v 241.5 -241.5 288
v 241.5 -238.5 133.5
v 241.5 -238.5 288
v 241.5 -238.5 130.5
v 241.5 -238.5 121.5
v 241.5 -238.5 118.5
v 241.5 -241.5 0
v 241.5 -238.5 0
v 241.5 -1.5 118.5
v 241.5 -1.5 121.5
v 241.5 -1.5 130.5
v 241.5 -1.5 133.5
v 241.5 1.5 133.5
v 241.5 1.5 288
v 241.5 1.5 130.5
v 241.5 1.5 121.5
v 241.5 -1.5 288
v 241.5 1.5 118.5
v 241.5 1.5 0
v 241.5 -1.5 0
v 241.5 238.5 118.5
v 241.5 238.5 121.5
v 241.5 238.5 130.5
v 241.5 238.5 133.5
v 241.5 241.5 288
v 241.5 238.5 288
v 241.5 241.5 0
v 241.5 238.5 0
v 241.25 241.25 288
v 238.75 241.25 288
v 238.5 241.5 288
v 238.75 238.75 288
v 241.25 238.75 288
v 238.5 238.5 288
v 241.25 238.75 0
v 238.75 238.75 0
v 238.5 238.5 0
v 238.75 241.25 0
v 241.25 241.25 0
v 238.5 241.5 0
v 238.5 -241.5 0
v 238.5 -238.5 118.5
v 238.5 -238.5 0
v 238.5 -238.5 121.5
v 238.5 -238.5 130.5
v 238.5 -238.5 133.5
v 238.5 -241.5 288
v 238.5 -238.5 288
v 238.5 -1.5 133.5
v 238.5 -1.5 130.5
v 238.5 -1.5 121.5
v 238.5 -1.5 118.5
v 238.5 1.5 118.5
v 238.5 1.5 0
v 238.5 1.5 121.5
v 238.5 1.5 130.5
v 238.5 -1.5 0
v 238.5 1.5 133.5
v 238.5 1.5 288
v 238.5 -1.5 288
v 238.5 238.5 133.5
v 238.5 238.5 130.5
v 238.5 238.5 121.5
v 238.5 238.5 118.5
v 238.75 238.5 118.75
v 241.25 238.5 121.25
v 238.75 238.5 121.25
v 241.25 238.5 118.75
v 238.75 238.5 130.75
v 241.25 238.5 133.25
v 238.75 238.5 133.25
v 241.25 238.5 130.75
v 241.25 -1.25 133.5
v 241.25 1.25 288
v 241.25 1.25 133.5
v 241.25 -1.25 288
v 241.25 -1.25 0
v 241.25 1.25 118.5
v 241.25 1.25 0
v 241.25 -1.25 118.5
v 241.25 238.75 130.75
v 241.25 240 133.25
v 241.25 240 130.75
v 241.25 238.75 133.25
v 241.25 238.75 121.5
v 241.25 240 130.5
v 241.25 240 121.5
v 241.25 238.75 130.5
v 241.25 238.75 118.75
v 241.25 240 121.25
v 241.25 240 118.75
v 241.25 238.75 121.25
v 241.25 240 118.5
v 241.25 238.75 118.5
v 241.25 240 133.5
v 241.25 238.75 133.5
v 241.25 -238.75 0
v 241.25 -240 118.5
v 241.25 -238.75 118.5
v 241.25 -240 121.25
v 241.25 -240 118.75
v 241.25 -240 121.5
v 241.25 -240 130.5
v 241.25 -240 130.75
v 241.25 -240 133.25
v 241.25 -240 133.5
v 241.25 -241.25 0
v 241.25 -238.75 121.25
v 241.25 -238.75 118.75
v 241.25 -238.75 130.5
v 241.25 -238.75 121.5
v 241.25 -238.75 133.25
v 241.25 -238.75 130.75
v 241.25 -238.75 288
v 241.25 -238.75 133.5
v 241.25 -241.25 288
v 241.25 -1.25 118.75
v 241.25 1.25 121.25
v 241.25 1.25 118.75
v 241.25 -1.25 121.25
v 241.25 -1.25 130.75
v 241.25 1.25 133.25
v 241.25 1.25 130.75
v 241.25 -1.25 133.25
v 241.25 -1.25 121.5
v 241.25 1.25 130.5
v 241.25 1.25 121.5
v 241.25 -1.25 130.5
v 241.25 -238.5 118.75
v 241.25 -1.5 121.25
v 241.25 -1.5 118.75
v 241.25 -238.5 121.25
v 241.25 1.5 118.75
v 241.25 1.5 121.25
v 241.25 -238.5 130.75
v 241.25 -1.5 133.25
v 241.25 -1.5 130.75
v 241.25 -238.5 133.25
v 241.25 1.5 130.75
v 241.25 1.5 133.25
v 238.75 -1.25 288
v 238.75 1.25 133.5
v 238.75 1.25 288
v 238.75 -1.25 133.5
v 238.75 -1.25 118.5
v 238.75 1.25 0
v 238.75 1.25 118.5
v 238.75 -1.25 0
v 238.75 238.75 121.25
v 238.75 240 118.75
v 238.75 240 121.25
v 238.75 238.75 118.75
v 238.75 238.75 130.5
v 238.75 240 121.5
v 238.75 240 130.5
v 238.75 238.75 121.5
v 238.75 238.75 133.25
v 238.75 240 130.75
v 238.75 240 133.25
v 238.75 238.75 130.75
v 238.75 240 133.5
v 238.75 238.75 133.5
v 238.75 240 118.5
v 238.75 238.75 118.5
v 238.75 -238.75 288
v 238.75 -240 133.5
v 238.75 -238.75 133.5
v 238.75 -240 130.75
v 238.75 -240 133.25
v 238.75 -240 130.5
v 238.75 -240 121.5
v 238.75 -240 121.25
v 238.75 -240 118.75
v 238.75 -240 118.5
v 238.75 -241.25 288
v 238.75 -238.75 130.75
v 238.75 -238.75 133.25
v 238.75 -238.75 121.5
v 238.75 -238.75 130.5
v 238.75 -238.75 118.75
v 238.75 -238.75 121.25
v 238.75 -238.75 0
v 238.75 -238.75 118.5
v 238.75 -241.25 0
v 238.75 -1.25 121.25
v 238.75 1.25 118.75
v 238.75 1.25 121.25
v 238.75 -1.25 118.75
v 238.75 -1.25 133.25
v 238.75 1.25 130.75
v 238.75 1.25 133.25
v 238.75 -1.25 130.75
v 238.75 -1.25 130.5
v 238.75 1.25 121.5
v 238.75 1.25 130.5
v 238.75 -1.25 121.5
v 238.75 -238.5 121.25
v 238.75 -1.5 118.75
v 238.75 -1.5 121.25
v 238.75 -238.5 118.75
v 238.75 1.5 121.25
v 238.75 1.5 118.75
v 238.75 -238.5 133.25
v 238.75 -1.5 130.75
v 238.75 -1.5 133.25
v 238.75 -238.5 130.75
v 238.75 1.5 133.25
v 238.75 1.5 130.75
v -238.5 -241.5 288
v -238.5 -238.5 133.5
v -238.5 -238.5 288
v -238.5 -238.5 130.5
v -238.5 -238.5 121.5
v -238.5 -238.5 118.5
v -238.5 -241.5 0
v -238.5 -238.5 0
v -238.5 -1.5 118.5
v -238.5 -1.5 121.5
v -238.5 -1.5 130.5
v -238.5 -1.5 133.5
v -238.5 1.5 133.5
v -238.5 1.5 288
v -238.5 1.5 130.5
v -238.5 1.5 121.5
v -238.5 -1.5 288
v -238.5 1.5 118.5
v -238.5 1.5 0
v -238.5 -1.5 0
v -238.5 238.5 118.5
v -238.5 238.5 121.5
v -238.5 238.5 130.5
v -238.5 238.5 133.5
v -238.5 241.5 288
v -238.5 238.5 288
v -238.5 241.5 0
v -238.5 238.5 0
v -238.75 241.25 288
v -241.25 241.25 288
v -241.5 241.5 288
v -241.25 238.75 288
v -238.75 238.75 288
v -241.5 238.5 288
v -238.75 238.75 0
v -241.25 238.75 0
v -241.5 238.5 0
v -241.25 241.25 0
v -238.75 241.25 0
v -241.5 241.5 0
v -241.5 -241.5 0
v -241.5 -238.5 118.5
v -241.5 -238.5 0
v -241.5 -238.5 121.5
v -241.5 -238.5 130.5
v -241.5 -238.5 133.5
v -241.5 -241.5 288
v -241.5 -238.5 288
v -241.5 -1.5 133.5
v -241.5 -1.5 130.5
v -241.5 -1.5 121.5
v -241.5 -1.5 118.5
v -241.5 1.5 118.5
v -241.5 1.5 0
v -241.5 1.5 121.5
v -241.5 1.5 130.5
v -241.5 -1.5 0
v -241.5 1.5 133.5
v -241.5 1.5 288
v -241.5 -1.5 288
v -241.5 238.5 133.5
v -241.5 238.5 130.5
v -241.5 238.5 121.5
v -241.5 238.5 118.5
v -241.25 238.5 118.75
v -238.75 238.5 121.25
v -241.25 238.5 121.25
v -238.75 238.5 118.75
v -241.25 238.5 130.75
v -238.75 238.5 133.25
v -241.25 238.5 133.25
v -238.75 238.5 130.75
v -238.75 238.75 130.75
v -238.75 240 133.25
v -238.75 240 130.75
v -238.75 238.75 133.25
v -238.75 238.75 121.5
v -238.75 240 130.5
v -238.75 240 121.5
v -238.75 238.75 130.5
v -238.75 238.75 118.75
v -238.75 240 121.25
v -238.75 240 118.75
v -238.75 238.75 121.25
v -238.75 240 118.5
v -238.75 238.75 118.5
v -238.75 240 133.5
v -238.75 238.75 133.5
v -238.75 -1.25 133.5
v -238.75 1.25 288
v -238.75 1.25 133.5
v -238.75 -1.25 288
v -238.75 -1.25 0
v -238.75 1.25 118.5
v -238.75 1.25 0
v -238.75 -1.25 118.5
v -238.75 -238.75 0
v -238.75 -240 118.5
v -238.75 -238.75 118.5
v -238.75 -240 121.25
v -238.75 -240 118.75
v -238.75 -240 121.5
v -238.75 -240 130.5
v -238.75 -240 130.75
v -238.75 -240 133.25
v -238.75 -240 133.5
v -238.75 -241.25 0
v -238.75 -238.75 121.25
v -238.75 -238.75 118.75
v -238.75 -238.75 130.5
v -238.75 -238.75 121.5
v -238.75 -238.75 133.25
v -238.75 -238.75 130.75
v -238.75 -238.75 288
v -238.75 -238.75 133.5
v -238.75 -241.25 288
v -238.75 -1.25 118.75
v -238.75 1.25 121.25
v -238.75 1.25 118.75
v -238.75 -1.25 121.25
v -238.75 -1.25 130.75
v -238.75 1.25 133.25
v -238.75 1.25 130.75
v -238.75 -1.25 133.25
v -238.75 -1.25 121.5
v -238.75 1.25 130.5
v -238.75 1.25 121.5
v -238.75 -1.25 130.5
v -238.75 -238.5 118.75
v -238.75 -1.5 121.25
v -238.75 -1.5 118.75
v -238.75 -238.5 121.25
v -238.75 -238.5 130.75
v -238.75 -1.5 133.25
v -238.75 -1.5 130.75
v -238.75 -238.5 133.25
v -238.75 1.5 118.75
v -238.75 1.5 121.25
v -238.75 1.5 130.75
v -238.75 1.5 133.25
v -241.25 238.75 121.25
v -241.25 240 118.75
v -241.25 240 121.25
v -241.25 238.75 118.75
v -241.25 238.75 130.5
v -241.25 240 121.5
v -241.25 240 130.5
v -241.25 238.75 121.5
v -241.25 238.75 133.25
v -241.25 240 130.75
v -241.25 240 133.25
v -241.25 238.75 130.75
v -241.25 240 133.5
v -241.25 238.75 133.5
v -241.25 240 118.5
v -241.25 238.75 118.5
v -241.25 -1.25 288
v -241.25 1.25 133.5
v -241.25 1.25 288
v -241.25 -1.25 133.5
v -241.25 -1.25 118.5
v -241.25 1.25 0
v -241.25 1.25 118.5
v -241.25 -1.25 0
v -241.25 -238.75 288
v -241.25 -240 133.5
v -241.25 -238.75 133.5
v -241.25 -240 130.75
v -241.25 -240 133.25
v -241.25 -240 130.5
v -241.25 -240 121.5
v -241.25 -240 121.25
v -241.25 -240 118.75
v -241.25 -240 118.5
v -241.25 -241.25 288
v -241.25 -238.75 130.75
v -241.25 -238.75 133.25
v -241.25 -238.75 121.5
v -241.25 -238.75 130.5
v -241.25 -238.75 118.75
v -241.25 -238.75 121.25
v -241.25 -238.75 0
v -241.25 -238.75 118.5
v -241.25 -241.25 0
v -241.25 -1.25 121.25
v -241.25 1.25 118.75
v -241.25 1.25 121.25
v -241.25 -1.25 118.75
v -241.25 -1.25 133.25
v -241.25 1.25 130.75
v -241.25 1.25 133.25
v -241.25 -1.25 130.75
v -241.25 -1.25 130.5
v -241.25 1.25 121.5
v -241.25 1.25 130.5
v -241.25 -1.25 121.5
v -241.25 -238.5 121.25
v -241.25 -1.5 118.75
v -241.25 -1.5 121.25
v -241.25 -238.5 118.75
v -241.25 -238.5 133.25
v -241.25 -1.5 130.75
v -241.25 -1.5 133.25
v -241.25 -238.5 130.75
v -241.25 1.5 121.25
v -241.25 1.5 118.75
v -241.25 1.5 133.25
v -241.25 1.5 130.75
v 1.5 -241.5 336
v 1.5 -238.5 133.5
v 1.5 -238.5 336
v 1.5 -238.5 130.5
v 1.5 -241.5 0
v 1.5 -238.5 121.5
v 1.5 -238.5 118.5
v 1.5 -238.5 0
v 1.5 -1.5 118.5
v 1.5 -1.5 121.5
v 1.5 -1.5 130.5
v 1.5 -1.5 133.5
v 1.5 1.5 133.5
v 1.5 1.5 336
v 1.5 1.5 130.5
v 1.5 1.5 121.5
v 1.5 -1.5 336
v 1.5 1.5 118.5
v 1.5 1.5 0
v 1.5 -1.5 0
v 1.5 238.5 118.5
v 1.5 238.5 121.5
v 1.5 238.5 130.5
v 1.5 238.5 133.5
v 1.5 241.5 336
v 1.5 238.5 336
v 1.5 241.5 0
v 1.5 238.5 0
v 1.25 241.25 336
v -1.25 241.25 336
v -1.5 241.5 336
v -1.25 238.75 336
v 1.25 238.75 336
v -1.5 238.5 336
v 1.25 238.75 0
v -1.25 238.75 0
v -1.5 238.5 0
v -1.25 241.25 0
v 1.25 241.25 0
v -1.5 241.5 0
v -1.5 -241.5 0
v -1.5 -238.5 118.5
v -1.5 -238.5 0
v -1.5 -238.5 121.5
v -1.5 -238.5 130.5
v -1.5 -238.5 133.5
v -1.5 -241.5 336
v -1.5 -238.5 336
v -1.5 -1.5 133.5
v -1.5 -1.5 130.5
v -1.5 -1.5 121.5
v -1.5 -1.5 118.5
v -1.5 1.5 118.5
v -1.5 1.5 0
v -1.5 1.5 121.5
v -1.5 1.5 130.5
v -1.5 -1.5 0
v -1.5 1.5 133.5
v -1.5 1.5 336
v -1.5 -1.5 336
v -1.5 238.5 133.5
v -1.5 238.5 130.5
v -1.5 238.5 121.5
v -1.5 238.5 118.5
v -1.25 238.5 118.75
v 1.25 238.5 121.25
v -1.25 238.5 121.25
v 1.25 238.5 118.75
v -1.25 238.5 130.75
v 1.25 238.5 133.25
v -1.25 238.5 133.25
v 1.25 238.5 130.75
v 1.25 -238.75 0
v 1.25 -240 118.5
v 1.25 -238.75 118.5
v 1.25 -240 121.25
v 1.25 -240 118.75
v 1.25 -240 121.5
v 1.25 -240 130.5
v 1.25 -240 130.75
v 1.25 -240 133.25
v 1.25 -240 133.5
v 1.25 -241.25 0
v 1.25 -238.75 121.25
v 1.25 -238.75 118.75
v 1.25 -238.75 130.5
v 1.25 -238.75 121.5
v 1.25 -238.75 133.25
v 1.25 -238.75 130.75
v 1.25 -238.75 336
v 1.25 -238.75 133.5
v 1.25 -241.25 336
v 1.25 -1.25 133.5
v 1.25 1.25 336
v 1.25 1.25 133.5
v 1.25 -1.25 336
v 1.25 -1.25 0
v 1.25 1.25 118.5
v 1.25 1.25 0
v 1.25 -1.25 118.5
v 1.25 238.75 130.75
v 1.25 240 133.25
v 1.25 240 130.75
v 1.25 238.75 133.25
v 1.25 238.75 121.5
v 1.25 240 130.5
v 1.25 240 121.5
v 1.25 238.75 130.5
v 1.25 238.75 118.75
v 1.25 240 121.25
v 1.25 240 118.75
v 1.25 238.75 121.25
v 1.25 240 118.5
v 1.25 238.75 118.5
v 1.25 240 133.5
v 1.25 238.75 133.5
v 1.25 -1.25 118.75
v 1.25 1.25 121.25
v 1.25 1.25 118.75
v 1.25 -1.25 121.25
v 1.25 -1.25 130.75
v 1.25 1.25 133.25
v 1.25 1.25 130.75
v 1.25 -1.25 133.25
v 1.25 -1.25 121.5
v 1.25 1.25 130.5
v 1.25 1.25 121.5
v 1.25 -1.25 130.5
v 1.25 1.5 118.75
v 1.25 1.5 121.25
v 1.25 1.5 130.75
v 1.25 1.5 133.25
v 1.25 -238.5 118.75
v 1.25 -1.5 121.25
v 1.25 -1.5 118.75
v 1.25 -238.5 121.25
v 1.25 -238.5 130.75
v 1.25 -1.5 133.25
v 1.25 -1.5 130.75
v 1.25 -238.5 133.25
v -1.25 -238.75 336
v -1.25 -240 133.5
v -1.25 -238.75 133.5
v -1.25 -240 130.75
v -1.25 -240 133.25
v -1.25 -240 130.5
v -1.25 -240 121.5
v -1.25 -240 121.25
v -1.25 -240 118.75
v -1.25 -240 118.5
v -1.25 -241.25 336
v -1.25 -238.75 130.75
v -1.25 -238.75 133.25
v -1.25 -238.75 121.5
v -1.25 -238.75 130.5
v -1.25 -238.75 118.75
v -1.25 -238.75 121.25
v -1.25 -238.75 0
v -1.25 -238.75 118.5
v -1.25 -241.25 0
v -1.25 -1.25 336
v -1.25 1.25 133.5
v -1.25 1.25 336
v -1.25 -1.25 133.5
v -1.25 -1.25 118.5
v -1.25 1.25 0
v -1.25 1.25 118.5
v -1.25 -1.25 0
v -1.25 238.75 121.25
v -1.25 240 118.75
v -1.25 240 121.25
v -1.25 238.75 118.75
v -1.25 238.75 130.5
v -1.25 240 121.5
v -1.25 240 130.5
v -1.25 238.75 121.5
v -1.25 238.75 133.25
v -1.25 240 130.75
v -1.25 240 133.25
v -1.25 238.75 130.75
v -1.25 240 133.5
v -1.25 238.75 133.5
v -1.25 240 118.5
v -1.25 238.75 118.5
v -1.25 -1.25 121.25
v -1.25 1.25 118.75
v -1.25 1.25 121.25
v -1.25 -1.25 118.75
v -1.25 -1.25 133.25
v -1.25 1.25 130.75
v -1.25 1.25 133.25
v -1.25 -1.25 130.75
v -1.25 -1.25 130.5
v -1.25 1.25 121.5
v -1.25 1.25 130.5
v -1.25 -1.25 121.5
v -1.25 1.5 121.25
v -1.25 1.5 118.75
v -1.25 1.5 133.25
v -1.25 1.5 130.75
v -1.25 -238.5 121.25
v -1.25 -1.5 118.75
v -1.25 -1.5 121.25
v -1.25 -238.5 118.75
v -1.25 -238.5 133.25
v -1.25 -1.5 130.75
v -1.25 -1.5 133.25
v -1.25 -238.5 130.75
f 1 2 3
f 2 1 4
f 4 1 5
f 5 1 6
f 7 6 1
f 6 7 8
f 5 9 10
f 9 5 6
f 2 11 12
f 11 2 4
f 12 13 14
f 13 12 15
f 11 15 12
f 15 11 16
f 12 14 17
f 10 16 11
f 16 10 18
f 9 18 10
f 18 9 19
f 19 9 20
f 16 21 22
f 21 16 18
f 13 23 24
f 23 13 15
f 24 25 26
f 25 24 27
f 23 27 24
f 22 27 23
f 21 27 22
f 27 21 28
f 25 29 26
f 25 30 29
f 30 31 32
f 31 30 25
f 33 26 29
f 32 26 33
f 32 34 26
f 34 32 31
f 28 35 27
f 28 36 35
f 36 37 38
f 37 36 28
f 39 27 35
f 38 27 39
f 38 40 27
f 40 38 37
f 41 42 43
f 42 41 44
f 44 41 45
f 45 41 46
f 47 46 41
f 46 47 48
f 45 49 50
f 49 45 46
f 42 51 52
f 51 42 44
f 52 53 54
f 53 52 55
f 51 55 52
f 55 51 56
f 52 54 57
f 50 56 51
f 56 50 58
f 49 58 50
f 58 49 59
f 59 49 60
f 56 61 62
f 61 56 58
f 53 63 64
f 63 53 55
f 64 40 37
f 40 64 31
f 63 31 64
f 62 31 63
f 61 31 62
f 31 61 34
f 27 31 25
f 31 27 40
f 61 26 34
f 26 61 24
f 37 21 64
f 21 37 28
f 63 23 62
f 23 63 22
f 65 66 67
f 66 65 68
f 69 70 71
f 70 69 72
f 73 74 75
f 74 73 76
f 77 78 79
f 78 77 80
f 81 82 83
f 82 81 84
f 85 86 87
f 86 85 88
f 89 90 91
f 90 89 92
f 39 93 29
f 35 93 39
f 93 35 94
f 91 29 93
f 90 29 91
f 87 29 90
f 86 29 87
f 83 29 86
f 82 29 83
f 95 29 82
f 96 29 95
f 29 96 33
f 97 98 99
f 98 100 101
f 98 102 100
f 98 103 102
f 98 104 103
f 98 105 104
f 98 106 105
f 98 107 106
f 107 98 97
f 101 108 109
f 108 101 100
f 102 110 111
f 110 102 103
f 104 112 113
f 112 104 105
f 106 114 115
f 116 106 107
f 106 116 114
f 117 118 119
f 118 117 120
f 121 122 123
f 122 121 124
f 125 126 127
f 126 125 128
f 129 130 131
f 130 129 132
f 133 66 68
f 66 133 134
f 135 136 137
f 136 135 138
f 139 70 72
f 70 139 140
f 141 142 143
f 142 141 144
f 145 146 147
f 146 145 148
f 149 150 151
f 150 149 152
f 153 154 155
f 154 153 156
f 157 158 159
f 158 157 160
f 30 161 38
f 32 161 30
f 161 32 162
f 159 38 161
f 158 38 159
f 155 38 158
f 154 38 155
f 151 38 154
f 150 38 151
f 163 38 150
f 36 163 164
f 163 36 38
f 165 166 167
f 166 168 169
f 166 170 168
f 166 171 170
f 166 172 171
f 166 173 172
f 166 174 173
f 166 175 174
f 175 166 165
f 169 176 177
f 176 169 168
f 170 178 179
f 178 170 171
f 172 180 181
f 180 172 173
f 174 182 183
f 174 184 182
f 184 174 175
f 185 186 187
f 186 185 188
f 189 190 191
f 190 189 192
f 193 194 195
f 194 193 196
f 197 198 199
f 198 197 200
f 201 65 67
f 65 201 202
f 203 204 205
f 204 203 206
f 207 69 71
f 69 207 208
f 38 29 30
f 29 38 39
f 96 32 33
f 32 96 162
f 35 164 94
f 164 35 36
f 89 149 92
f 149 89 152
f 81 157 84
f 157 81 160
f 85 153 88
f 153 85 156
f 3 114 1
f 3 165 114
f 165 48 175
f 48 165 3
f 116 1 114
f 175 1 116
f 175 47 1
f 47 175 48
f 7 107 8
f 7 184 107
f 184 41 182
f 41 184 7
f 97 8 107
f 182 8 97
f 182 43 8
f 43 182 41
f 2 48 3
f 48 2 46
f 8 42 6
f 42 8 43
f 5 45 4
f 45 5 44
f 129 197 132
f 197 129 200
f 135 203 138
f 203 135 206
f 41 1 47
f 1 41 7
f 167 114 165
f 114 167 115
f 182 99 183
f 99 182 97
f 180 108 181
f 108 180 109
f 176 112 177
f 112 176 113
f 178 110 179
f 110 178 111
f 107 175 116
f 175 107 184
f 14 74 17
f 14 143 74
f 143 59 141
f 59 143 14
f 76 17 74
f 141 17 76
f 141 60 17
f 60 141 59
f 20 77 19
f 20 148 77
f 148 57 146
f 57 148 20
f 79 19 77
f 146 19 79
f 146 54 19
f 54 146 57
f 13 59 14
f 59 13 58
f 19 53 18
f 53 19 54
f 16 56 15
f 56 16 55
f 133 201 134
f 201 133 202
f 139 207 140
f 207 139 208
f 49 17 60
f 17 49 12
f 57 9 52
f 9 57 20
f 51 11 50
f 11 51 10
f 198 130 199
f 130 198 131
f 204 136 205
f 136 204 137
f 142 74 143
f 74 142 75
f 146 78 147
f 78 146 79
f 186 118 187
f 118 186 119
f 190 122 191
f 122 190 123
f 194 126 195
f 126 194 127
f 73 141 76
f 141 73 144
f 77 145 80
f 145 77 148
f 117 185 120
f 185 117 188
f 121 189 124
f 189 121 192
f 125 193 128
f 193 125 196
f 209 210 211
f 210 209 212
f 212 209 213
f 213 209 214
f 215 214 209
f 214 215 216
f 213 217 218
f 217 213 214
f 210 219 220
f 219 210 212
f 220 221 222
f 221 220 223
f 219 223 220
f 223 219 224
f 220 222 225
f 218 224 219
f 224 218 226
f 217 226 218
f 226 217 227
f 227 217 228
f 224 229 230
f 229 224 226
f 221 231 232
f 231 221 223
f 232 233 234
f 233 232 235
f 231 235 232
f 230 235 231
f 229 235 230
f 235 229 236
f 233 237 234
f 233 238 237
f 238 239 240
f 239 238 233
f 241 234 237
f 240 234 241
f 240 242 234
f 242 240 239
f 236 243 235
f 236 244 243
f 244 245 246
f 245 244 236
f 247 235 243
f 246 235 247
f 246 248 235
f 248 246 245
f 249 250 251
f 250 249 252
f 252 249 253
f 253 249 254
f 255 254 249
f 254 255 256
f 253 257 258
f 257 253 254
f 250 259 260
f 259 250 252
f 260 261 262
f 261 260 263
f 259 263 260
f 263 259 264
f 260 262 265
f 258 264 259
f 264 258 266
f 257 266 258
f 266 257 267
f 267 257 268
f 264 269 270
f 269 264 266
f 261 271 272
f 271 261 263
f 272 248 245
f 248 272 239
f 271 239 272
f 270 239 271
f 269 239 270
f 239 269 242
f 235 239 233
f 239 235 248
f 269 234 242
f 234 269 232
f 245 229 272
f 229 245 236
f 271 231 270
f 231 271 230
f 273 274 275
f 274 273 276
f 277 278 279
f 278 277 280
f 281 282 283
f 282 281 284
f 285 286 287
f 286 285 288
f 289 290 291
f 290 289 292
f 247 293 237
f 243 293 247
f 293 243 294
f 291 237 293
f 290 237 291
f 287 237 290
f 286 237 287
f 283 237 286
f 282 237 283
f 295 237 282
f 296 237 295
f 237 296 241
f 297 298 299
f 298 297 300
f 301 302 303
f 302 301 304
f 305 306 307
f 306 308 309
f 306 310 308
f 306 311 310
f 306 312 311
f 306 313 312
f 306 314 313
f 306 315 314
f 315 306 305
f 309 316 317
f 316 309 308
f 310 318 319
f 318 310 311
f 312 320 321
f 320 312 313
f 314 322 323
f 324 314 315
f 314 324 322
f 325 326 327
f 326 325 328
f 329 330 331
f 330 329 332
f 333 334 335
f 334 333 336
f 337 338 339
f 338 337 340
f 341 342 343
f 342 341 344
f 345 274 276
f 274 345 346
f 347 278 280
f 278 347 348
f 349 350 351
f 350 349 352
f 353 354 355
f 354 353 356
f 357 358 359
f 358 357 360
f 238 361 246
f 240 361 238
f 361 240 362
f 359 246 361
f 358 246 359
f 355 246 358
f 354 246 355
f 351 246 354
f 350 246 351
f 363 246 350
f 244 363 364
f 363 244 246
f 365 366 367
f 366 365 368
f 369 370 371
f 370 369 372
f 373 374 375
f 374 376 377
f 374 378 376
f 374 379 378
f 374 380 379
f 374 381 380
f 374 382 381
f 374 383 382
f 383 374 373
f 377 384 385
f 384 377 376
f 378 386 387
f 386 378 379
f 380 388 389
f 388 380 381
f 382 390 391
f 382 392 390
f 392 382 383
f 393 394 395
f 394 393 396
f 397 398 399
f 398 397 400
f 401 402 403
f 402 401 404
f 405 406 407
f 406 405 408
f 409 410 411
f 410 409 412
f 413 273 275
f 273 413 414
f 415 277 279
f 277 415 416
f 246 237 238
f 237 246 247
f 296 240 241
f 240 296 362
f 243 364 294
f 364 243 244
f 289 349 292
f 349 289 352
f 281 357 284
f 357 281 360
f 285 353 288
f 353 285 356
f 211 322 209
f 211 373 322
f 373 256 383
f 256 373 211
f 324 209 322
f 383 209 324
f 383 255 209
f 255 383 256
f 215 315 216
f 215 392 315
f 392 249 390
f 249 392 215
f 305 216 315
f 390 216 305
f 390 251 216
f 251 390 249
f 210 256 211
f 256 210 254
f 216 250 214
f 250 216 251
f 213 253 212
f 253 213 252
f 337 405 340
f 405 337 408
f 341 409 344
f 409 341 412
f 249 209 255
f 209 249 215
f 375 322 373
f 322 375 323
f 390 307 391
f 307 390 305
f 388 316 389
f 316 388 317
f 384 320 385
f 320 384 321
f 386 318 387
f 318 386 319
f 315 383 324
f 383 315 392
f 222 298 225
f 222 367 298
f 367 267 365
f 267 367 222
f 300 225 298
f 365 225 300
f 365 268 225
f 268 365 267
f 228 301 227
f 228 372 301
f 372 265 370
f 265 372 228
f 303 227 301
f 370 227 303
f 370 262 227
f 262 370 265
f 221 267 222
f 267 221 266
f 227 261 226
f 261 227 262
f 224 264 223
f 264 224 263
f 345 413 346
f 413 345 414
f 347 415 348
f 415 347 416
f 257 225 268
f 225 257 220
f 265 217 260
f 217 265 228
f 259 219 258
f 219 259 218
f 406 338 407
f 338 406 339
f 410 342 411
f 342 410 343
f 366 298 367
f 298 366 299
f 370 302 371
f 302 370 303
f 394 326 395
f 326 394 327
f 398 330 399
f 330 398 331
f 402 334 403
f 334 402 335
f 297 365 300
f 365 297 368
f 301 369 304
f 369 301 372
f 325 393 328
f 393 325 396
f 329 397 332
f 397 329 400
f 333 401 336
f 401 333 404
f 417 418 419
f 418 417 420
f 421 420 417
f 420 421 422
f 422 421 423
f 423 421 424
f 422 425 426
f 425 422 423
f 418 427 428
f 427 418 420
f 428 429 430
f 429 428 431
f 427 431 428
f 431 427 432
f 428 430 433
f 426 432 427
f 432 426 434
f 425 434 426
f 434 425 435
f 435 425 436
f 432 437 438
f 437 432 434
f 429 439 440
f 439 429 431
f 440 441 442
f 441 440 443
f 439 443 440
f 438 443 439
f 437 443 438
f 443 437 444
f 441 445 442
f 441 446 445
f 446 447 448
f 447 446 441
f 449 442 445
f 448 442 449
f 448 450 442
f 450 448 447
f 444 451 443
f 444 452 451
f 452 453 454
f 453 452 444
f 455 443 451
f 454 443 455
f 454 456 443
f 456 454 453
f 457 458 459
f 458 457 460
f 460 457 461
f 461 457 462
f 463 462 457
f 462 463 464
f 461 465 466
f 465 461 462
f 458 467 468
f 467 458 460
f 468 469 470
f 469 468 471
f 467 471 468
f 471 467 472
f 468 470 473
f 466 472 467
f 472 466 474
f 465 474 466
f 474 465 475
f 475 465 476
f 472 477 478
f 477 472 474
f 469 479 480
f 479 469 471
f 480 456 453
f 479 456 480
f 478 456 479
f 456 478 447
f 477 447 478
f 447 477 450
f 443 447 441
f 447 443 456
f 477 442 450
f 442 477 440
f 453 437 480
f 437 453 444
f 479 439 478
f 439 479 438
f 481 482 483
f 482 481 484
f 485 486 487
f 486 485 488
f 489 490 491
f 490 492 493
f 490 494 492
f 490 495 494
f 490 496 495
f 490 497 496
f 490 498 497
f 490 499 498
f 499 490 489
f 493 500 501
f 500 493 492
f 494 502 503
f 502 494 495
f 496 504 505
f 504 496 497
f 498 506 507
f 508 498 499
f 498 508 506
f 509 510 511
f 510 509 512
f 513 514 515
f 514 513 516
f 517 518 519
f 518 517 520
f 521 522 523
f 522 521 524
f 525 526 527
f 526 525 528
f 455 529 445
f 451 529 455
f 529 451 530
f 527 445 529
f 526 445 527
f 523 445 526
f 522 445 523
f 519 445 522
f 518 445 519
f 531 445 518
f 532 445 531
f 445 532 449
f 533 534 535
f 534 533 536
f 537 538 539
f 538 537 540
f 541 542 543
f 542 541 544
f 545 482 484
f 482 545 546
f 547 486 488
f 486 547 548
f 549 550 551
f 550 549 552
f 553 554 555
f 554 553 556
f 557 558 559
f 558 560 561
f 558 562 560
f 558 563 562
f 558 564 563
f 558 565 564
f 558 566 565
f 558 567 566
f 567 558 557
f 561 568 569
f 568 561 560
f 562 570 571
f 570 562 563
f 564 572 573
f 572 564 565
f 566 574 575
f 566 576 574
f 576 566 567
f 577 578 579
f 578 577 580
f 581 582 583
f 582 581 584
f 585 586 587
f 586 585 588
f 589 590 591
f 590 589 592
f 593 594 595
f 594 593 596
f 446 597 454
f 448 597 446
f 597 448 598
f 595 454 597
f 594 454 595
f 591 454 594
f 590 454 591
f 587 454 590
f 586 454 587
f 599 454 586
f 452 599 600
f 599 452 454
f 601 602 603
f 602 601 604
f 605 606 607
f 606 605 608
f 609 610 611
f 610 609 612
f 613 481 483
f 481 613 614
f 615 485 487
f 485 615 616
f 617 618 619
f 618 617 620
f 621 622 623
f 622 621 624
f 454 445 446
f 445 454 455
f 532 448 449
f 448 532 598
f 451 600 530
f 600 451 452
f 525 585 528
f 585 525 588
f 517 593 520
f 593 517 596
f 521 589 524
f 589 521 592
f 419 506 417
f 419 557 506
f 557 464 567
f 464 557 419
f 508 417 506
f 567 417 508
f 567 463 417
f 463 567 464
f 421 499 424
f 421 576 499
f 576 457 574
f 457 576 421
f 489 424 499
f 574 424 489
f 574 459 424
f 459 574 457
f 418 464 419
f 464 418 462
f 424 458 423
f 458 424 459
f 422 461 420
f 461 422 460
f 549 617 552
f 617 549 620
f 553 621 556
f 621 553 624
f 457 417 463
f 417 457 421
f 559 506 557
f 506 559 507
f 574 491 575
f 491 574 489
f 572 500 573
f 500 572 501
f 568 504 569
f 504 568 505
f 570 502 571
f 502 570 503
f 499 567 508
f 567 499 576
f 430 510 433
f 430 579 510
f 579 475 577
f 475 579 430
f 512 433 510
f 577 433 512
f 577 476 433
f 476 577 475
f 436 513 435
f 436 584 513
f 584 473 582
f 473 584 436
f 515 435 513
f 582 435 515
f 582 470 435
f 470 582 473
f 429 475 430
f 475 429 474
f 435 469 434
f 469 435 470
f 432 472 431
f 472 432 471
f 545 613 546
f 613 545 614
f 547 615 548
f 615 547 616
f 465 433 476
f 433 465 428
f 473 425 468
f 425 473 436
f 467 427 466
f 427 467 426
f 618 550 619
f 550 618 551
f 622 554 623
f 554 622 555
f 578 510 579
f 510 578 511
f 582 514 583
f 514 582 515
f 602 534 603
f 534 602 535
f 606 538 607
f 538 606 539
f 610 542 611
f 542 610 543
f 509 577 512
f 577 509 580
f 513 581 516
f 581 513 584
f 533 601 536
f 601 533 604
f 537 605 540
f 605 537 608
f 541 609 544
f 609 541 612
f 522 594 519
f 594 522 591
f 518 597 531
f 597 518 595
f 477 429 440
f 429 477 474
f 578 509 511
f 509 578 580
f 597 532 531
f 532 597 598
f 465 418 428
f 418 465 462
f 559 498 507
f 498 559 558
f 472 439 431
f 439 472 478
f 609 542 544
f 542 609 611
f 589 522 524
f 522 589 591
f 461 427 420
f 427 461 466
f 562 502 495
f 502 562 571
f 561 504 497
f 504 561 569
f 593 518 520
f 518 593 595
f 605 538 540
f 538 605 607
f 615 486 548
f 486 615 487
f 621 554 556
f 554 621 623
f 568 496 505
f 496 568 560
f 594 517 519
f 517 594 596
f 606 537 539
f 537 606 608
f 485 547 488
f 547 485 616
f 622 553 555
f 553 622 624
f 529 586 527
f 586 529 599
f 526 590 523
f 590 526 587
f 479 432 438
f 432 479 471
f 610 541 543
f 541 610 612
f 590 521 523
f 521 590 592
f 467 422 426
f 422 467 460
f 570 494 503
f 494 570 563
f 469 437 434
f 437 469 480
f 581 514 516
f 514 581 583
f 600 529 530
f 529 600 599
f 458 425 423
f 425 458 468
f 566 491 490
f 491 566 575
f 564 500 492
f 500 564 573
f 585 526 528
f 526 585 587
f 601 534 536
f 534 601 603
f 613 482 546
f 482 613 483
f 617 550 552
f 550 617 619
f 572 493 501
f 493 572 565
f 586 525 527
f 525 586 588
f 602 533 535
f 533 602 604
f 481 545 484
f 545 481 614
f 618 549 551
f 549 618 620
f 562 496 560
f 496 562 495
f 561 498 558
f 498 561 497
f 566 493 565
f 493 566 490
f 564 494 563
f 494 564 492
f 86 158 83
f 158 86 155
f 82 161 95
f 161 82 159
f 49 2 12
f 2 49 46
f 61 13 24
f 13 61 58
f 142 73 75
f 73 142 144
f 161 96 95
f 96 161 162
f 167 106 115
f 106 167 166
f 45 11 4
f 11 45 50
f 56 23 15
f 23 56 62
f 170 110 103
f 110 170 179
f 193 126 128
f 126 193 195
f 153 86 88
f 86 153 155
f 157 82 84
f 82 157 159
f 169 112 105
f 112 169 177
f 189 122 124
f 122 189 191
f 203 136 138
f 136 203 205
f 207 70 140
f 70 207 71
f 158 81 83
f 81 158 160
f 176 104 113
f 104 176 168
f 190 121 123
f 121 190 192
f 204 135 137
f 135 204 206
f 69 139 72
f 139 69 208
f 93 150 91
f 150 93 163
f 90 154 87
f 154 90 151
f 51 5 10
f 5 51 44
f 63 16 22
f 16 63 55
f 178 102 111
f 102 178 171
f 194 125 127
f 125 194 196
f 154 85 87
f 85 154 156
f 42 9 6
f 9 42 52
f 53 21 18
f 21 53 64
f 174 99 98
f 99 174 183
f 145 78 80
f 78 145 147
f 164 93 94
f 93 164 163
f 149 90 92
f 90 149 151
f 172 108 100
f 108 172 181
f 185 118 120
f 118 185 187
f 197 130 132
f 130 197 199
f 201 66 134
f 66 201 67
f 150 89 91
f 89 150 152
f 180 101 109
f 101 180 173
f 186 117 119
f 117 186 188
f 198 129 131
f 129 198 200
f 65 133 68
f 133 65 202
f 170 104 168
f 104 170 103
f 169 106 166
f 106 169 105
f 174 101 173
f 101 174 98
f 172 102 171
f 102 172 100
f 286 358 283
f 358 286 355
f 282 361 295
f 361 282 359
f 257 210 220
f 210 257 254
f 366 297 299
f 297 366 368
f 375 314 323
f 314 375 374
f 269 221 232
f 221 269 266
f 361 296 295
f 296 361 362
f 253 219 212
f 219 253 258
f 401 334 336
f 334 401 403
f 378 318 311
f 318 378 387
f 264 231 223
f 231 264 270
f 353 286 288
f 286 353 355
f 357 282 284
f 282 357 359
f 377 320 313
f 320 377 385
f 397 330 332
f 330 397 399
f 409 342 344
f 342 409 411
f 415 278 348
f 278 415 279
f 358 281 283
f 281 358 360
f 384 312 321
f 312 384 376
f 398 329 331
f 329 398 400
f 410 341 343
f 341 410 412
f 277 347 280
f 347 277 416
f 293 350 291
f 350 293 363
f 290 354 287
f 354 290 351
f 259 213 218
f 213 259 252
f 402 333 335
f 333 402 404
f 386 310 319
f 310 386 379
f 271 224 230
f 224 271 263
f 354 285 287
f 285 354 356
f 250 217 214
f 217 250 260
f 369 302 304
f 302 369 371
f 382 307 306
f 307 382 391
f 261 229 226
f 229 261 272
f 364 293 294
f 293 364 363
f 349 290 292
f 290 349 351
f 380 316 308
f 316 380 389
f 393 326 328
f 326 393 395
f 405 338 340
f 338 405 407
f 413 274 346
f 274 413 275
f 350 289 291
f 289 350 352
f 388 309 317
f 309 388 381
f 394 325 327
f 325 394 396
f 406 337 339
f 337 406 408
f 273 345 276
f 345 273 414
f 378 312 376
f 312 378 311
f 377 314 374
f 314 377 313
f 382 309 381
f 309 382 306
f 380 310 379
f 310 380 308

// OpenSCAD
foot = 12;

ext_x = 40*foot;
ext_y = 40*foot;
ext_z_high = (24+4)*foot;
ext_z_low = 24*foot;

vert_beams_width = 3;
vert_beams_wall = 0.25;

sf_z = 11*foot; //second floor

module squareTube(length,outer,wall)
{
 difference()
 {
  cube([outer,outer,length],center=true);
  cube([outer-wall*2,outer-wall*2,length+1],center=true);
 }
}

module heavyBeam(length)
{
 rotate([90,0,0])
 squareTube(length,3,0.25);
 translate([0,0,-foot])
 rotate([90,0,0])
 squareTube(length,3,0.25);

}

module verticalPosts(length_z,location_x)
{
 translate([location_x,ext_y/2,length_z/2.0])
 squareTube(length_z,vert_beams_width,vert_beams_wall);
 translate([location_x,-ext_y/2,length_z/2.0])
 squareTube(length_z,vert_beams_width,vert_beams_wall);
 translate([location_x,0,length_z/2.0])
 squareTube(length_z,vert_beams_width,vert_beams_wall);
}

module weightBearingRibs()
{
 // VeritcalRibs
 verticalPosts(ext_z_low,ext_x/2);
 verticalPosts(ext_z_low,-ext_x/2);
 verticalPosts(ext_z_high,0);
 // Horizontal heavies
 translate([0,ext_y/4,sf_z])
 heavyBeam(ext_y/2);
 translate([0,-ext_y/4,sf_z])
 heavyBeam(ext_y/2);
 translate([ext_x/2,ext_y/4,sf_z])
 heavyBeam(ext_y/2);
 translate([ext_x/2,-ext_y/4,sf_z])
 heavyBeam(ext_y/2);
 translate([-ext_x/2,ext_y/4,sf_z])
 heavyBeam(ext_y/2);
 translate([-ext_x/2,-ext_y/4,sf_z])
 heavyBeam(ext_y/2);

}

weightBearingRibs();
